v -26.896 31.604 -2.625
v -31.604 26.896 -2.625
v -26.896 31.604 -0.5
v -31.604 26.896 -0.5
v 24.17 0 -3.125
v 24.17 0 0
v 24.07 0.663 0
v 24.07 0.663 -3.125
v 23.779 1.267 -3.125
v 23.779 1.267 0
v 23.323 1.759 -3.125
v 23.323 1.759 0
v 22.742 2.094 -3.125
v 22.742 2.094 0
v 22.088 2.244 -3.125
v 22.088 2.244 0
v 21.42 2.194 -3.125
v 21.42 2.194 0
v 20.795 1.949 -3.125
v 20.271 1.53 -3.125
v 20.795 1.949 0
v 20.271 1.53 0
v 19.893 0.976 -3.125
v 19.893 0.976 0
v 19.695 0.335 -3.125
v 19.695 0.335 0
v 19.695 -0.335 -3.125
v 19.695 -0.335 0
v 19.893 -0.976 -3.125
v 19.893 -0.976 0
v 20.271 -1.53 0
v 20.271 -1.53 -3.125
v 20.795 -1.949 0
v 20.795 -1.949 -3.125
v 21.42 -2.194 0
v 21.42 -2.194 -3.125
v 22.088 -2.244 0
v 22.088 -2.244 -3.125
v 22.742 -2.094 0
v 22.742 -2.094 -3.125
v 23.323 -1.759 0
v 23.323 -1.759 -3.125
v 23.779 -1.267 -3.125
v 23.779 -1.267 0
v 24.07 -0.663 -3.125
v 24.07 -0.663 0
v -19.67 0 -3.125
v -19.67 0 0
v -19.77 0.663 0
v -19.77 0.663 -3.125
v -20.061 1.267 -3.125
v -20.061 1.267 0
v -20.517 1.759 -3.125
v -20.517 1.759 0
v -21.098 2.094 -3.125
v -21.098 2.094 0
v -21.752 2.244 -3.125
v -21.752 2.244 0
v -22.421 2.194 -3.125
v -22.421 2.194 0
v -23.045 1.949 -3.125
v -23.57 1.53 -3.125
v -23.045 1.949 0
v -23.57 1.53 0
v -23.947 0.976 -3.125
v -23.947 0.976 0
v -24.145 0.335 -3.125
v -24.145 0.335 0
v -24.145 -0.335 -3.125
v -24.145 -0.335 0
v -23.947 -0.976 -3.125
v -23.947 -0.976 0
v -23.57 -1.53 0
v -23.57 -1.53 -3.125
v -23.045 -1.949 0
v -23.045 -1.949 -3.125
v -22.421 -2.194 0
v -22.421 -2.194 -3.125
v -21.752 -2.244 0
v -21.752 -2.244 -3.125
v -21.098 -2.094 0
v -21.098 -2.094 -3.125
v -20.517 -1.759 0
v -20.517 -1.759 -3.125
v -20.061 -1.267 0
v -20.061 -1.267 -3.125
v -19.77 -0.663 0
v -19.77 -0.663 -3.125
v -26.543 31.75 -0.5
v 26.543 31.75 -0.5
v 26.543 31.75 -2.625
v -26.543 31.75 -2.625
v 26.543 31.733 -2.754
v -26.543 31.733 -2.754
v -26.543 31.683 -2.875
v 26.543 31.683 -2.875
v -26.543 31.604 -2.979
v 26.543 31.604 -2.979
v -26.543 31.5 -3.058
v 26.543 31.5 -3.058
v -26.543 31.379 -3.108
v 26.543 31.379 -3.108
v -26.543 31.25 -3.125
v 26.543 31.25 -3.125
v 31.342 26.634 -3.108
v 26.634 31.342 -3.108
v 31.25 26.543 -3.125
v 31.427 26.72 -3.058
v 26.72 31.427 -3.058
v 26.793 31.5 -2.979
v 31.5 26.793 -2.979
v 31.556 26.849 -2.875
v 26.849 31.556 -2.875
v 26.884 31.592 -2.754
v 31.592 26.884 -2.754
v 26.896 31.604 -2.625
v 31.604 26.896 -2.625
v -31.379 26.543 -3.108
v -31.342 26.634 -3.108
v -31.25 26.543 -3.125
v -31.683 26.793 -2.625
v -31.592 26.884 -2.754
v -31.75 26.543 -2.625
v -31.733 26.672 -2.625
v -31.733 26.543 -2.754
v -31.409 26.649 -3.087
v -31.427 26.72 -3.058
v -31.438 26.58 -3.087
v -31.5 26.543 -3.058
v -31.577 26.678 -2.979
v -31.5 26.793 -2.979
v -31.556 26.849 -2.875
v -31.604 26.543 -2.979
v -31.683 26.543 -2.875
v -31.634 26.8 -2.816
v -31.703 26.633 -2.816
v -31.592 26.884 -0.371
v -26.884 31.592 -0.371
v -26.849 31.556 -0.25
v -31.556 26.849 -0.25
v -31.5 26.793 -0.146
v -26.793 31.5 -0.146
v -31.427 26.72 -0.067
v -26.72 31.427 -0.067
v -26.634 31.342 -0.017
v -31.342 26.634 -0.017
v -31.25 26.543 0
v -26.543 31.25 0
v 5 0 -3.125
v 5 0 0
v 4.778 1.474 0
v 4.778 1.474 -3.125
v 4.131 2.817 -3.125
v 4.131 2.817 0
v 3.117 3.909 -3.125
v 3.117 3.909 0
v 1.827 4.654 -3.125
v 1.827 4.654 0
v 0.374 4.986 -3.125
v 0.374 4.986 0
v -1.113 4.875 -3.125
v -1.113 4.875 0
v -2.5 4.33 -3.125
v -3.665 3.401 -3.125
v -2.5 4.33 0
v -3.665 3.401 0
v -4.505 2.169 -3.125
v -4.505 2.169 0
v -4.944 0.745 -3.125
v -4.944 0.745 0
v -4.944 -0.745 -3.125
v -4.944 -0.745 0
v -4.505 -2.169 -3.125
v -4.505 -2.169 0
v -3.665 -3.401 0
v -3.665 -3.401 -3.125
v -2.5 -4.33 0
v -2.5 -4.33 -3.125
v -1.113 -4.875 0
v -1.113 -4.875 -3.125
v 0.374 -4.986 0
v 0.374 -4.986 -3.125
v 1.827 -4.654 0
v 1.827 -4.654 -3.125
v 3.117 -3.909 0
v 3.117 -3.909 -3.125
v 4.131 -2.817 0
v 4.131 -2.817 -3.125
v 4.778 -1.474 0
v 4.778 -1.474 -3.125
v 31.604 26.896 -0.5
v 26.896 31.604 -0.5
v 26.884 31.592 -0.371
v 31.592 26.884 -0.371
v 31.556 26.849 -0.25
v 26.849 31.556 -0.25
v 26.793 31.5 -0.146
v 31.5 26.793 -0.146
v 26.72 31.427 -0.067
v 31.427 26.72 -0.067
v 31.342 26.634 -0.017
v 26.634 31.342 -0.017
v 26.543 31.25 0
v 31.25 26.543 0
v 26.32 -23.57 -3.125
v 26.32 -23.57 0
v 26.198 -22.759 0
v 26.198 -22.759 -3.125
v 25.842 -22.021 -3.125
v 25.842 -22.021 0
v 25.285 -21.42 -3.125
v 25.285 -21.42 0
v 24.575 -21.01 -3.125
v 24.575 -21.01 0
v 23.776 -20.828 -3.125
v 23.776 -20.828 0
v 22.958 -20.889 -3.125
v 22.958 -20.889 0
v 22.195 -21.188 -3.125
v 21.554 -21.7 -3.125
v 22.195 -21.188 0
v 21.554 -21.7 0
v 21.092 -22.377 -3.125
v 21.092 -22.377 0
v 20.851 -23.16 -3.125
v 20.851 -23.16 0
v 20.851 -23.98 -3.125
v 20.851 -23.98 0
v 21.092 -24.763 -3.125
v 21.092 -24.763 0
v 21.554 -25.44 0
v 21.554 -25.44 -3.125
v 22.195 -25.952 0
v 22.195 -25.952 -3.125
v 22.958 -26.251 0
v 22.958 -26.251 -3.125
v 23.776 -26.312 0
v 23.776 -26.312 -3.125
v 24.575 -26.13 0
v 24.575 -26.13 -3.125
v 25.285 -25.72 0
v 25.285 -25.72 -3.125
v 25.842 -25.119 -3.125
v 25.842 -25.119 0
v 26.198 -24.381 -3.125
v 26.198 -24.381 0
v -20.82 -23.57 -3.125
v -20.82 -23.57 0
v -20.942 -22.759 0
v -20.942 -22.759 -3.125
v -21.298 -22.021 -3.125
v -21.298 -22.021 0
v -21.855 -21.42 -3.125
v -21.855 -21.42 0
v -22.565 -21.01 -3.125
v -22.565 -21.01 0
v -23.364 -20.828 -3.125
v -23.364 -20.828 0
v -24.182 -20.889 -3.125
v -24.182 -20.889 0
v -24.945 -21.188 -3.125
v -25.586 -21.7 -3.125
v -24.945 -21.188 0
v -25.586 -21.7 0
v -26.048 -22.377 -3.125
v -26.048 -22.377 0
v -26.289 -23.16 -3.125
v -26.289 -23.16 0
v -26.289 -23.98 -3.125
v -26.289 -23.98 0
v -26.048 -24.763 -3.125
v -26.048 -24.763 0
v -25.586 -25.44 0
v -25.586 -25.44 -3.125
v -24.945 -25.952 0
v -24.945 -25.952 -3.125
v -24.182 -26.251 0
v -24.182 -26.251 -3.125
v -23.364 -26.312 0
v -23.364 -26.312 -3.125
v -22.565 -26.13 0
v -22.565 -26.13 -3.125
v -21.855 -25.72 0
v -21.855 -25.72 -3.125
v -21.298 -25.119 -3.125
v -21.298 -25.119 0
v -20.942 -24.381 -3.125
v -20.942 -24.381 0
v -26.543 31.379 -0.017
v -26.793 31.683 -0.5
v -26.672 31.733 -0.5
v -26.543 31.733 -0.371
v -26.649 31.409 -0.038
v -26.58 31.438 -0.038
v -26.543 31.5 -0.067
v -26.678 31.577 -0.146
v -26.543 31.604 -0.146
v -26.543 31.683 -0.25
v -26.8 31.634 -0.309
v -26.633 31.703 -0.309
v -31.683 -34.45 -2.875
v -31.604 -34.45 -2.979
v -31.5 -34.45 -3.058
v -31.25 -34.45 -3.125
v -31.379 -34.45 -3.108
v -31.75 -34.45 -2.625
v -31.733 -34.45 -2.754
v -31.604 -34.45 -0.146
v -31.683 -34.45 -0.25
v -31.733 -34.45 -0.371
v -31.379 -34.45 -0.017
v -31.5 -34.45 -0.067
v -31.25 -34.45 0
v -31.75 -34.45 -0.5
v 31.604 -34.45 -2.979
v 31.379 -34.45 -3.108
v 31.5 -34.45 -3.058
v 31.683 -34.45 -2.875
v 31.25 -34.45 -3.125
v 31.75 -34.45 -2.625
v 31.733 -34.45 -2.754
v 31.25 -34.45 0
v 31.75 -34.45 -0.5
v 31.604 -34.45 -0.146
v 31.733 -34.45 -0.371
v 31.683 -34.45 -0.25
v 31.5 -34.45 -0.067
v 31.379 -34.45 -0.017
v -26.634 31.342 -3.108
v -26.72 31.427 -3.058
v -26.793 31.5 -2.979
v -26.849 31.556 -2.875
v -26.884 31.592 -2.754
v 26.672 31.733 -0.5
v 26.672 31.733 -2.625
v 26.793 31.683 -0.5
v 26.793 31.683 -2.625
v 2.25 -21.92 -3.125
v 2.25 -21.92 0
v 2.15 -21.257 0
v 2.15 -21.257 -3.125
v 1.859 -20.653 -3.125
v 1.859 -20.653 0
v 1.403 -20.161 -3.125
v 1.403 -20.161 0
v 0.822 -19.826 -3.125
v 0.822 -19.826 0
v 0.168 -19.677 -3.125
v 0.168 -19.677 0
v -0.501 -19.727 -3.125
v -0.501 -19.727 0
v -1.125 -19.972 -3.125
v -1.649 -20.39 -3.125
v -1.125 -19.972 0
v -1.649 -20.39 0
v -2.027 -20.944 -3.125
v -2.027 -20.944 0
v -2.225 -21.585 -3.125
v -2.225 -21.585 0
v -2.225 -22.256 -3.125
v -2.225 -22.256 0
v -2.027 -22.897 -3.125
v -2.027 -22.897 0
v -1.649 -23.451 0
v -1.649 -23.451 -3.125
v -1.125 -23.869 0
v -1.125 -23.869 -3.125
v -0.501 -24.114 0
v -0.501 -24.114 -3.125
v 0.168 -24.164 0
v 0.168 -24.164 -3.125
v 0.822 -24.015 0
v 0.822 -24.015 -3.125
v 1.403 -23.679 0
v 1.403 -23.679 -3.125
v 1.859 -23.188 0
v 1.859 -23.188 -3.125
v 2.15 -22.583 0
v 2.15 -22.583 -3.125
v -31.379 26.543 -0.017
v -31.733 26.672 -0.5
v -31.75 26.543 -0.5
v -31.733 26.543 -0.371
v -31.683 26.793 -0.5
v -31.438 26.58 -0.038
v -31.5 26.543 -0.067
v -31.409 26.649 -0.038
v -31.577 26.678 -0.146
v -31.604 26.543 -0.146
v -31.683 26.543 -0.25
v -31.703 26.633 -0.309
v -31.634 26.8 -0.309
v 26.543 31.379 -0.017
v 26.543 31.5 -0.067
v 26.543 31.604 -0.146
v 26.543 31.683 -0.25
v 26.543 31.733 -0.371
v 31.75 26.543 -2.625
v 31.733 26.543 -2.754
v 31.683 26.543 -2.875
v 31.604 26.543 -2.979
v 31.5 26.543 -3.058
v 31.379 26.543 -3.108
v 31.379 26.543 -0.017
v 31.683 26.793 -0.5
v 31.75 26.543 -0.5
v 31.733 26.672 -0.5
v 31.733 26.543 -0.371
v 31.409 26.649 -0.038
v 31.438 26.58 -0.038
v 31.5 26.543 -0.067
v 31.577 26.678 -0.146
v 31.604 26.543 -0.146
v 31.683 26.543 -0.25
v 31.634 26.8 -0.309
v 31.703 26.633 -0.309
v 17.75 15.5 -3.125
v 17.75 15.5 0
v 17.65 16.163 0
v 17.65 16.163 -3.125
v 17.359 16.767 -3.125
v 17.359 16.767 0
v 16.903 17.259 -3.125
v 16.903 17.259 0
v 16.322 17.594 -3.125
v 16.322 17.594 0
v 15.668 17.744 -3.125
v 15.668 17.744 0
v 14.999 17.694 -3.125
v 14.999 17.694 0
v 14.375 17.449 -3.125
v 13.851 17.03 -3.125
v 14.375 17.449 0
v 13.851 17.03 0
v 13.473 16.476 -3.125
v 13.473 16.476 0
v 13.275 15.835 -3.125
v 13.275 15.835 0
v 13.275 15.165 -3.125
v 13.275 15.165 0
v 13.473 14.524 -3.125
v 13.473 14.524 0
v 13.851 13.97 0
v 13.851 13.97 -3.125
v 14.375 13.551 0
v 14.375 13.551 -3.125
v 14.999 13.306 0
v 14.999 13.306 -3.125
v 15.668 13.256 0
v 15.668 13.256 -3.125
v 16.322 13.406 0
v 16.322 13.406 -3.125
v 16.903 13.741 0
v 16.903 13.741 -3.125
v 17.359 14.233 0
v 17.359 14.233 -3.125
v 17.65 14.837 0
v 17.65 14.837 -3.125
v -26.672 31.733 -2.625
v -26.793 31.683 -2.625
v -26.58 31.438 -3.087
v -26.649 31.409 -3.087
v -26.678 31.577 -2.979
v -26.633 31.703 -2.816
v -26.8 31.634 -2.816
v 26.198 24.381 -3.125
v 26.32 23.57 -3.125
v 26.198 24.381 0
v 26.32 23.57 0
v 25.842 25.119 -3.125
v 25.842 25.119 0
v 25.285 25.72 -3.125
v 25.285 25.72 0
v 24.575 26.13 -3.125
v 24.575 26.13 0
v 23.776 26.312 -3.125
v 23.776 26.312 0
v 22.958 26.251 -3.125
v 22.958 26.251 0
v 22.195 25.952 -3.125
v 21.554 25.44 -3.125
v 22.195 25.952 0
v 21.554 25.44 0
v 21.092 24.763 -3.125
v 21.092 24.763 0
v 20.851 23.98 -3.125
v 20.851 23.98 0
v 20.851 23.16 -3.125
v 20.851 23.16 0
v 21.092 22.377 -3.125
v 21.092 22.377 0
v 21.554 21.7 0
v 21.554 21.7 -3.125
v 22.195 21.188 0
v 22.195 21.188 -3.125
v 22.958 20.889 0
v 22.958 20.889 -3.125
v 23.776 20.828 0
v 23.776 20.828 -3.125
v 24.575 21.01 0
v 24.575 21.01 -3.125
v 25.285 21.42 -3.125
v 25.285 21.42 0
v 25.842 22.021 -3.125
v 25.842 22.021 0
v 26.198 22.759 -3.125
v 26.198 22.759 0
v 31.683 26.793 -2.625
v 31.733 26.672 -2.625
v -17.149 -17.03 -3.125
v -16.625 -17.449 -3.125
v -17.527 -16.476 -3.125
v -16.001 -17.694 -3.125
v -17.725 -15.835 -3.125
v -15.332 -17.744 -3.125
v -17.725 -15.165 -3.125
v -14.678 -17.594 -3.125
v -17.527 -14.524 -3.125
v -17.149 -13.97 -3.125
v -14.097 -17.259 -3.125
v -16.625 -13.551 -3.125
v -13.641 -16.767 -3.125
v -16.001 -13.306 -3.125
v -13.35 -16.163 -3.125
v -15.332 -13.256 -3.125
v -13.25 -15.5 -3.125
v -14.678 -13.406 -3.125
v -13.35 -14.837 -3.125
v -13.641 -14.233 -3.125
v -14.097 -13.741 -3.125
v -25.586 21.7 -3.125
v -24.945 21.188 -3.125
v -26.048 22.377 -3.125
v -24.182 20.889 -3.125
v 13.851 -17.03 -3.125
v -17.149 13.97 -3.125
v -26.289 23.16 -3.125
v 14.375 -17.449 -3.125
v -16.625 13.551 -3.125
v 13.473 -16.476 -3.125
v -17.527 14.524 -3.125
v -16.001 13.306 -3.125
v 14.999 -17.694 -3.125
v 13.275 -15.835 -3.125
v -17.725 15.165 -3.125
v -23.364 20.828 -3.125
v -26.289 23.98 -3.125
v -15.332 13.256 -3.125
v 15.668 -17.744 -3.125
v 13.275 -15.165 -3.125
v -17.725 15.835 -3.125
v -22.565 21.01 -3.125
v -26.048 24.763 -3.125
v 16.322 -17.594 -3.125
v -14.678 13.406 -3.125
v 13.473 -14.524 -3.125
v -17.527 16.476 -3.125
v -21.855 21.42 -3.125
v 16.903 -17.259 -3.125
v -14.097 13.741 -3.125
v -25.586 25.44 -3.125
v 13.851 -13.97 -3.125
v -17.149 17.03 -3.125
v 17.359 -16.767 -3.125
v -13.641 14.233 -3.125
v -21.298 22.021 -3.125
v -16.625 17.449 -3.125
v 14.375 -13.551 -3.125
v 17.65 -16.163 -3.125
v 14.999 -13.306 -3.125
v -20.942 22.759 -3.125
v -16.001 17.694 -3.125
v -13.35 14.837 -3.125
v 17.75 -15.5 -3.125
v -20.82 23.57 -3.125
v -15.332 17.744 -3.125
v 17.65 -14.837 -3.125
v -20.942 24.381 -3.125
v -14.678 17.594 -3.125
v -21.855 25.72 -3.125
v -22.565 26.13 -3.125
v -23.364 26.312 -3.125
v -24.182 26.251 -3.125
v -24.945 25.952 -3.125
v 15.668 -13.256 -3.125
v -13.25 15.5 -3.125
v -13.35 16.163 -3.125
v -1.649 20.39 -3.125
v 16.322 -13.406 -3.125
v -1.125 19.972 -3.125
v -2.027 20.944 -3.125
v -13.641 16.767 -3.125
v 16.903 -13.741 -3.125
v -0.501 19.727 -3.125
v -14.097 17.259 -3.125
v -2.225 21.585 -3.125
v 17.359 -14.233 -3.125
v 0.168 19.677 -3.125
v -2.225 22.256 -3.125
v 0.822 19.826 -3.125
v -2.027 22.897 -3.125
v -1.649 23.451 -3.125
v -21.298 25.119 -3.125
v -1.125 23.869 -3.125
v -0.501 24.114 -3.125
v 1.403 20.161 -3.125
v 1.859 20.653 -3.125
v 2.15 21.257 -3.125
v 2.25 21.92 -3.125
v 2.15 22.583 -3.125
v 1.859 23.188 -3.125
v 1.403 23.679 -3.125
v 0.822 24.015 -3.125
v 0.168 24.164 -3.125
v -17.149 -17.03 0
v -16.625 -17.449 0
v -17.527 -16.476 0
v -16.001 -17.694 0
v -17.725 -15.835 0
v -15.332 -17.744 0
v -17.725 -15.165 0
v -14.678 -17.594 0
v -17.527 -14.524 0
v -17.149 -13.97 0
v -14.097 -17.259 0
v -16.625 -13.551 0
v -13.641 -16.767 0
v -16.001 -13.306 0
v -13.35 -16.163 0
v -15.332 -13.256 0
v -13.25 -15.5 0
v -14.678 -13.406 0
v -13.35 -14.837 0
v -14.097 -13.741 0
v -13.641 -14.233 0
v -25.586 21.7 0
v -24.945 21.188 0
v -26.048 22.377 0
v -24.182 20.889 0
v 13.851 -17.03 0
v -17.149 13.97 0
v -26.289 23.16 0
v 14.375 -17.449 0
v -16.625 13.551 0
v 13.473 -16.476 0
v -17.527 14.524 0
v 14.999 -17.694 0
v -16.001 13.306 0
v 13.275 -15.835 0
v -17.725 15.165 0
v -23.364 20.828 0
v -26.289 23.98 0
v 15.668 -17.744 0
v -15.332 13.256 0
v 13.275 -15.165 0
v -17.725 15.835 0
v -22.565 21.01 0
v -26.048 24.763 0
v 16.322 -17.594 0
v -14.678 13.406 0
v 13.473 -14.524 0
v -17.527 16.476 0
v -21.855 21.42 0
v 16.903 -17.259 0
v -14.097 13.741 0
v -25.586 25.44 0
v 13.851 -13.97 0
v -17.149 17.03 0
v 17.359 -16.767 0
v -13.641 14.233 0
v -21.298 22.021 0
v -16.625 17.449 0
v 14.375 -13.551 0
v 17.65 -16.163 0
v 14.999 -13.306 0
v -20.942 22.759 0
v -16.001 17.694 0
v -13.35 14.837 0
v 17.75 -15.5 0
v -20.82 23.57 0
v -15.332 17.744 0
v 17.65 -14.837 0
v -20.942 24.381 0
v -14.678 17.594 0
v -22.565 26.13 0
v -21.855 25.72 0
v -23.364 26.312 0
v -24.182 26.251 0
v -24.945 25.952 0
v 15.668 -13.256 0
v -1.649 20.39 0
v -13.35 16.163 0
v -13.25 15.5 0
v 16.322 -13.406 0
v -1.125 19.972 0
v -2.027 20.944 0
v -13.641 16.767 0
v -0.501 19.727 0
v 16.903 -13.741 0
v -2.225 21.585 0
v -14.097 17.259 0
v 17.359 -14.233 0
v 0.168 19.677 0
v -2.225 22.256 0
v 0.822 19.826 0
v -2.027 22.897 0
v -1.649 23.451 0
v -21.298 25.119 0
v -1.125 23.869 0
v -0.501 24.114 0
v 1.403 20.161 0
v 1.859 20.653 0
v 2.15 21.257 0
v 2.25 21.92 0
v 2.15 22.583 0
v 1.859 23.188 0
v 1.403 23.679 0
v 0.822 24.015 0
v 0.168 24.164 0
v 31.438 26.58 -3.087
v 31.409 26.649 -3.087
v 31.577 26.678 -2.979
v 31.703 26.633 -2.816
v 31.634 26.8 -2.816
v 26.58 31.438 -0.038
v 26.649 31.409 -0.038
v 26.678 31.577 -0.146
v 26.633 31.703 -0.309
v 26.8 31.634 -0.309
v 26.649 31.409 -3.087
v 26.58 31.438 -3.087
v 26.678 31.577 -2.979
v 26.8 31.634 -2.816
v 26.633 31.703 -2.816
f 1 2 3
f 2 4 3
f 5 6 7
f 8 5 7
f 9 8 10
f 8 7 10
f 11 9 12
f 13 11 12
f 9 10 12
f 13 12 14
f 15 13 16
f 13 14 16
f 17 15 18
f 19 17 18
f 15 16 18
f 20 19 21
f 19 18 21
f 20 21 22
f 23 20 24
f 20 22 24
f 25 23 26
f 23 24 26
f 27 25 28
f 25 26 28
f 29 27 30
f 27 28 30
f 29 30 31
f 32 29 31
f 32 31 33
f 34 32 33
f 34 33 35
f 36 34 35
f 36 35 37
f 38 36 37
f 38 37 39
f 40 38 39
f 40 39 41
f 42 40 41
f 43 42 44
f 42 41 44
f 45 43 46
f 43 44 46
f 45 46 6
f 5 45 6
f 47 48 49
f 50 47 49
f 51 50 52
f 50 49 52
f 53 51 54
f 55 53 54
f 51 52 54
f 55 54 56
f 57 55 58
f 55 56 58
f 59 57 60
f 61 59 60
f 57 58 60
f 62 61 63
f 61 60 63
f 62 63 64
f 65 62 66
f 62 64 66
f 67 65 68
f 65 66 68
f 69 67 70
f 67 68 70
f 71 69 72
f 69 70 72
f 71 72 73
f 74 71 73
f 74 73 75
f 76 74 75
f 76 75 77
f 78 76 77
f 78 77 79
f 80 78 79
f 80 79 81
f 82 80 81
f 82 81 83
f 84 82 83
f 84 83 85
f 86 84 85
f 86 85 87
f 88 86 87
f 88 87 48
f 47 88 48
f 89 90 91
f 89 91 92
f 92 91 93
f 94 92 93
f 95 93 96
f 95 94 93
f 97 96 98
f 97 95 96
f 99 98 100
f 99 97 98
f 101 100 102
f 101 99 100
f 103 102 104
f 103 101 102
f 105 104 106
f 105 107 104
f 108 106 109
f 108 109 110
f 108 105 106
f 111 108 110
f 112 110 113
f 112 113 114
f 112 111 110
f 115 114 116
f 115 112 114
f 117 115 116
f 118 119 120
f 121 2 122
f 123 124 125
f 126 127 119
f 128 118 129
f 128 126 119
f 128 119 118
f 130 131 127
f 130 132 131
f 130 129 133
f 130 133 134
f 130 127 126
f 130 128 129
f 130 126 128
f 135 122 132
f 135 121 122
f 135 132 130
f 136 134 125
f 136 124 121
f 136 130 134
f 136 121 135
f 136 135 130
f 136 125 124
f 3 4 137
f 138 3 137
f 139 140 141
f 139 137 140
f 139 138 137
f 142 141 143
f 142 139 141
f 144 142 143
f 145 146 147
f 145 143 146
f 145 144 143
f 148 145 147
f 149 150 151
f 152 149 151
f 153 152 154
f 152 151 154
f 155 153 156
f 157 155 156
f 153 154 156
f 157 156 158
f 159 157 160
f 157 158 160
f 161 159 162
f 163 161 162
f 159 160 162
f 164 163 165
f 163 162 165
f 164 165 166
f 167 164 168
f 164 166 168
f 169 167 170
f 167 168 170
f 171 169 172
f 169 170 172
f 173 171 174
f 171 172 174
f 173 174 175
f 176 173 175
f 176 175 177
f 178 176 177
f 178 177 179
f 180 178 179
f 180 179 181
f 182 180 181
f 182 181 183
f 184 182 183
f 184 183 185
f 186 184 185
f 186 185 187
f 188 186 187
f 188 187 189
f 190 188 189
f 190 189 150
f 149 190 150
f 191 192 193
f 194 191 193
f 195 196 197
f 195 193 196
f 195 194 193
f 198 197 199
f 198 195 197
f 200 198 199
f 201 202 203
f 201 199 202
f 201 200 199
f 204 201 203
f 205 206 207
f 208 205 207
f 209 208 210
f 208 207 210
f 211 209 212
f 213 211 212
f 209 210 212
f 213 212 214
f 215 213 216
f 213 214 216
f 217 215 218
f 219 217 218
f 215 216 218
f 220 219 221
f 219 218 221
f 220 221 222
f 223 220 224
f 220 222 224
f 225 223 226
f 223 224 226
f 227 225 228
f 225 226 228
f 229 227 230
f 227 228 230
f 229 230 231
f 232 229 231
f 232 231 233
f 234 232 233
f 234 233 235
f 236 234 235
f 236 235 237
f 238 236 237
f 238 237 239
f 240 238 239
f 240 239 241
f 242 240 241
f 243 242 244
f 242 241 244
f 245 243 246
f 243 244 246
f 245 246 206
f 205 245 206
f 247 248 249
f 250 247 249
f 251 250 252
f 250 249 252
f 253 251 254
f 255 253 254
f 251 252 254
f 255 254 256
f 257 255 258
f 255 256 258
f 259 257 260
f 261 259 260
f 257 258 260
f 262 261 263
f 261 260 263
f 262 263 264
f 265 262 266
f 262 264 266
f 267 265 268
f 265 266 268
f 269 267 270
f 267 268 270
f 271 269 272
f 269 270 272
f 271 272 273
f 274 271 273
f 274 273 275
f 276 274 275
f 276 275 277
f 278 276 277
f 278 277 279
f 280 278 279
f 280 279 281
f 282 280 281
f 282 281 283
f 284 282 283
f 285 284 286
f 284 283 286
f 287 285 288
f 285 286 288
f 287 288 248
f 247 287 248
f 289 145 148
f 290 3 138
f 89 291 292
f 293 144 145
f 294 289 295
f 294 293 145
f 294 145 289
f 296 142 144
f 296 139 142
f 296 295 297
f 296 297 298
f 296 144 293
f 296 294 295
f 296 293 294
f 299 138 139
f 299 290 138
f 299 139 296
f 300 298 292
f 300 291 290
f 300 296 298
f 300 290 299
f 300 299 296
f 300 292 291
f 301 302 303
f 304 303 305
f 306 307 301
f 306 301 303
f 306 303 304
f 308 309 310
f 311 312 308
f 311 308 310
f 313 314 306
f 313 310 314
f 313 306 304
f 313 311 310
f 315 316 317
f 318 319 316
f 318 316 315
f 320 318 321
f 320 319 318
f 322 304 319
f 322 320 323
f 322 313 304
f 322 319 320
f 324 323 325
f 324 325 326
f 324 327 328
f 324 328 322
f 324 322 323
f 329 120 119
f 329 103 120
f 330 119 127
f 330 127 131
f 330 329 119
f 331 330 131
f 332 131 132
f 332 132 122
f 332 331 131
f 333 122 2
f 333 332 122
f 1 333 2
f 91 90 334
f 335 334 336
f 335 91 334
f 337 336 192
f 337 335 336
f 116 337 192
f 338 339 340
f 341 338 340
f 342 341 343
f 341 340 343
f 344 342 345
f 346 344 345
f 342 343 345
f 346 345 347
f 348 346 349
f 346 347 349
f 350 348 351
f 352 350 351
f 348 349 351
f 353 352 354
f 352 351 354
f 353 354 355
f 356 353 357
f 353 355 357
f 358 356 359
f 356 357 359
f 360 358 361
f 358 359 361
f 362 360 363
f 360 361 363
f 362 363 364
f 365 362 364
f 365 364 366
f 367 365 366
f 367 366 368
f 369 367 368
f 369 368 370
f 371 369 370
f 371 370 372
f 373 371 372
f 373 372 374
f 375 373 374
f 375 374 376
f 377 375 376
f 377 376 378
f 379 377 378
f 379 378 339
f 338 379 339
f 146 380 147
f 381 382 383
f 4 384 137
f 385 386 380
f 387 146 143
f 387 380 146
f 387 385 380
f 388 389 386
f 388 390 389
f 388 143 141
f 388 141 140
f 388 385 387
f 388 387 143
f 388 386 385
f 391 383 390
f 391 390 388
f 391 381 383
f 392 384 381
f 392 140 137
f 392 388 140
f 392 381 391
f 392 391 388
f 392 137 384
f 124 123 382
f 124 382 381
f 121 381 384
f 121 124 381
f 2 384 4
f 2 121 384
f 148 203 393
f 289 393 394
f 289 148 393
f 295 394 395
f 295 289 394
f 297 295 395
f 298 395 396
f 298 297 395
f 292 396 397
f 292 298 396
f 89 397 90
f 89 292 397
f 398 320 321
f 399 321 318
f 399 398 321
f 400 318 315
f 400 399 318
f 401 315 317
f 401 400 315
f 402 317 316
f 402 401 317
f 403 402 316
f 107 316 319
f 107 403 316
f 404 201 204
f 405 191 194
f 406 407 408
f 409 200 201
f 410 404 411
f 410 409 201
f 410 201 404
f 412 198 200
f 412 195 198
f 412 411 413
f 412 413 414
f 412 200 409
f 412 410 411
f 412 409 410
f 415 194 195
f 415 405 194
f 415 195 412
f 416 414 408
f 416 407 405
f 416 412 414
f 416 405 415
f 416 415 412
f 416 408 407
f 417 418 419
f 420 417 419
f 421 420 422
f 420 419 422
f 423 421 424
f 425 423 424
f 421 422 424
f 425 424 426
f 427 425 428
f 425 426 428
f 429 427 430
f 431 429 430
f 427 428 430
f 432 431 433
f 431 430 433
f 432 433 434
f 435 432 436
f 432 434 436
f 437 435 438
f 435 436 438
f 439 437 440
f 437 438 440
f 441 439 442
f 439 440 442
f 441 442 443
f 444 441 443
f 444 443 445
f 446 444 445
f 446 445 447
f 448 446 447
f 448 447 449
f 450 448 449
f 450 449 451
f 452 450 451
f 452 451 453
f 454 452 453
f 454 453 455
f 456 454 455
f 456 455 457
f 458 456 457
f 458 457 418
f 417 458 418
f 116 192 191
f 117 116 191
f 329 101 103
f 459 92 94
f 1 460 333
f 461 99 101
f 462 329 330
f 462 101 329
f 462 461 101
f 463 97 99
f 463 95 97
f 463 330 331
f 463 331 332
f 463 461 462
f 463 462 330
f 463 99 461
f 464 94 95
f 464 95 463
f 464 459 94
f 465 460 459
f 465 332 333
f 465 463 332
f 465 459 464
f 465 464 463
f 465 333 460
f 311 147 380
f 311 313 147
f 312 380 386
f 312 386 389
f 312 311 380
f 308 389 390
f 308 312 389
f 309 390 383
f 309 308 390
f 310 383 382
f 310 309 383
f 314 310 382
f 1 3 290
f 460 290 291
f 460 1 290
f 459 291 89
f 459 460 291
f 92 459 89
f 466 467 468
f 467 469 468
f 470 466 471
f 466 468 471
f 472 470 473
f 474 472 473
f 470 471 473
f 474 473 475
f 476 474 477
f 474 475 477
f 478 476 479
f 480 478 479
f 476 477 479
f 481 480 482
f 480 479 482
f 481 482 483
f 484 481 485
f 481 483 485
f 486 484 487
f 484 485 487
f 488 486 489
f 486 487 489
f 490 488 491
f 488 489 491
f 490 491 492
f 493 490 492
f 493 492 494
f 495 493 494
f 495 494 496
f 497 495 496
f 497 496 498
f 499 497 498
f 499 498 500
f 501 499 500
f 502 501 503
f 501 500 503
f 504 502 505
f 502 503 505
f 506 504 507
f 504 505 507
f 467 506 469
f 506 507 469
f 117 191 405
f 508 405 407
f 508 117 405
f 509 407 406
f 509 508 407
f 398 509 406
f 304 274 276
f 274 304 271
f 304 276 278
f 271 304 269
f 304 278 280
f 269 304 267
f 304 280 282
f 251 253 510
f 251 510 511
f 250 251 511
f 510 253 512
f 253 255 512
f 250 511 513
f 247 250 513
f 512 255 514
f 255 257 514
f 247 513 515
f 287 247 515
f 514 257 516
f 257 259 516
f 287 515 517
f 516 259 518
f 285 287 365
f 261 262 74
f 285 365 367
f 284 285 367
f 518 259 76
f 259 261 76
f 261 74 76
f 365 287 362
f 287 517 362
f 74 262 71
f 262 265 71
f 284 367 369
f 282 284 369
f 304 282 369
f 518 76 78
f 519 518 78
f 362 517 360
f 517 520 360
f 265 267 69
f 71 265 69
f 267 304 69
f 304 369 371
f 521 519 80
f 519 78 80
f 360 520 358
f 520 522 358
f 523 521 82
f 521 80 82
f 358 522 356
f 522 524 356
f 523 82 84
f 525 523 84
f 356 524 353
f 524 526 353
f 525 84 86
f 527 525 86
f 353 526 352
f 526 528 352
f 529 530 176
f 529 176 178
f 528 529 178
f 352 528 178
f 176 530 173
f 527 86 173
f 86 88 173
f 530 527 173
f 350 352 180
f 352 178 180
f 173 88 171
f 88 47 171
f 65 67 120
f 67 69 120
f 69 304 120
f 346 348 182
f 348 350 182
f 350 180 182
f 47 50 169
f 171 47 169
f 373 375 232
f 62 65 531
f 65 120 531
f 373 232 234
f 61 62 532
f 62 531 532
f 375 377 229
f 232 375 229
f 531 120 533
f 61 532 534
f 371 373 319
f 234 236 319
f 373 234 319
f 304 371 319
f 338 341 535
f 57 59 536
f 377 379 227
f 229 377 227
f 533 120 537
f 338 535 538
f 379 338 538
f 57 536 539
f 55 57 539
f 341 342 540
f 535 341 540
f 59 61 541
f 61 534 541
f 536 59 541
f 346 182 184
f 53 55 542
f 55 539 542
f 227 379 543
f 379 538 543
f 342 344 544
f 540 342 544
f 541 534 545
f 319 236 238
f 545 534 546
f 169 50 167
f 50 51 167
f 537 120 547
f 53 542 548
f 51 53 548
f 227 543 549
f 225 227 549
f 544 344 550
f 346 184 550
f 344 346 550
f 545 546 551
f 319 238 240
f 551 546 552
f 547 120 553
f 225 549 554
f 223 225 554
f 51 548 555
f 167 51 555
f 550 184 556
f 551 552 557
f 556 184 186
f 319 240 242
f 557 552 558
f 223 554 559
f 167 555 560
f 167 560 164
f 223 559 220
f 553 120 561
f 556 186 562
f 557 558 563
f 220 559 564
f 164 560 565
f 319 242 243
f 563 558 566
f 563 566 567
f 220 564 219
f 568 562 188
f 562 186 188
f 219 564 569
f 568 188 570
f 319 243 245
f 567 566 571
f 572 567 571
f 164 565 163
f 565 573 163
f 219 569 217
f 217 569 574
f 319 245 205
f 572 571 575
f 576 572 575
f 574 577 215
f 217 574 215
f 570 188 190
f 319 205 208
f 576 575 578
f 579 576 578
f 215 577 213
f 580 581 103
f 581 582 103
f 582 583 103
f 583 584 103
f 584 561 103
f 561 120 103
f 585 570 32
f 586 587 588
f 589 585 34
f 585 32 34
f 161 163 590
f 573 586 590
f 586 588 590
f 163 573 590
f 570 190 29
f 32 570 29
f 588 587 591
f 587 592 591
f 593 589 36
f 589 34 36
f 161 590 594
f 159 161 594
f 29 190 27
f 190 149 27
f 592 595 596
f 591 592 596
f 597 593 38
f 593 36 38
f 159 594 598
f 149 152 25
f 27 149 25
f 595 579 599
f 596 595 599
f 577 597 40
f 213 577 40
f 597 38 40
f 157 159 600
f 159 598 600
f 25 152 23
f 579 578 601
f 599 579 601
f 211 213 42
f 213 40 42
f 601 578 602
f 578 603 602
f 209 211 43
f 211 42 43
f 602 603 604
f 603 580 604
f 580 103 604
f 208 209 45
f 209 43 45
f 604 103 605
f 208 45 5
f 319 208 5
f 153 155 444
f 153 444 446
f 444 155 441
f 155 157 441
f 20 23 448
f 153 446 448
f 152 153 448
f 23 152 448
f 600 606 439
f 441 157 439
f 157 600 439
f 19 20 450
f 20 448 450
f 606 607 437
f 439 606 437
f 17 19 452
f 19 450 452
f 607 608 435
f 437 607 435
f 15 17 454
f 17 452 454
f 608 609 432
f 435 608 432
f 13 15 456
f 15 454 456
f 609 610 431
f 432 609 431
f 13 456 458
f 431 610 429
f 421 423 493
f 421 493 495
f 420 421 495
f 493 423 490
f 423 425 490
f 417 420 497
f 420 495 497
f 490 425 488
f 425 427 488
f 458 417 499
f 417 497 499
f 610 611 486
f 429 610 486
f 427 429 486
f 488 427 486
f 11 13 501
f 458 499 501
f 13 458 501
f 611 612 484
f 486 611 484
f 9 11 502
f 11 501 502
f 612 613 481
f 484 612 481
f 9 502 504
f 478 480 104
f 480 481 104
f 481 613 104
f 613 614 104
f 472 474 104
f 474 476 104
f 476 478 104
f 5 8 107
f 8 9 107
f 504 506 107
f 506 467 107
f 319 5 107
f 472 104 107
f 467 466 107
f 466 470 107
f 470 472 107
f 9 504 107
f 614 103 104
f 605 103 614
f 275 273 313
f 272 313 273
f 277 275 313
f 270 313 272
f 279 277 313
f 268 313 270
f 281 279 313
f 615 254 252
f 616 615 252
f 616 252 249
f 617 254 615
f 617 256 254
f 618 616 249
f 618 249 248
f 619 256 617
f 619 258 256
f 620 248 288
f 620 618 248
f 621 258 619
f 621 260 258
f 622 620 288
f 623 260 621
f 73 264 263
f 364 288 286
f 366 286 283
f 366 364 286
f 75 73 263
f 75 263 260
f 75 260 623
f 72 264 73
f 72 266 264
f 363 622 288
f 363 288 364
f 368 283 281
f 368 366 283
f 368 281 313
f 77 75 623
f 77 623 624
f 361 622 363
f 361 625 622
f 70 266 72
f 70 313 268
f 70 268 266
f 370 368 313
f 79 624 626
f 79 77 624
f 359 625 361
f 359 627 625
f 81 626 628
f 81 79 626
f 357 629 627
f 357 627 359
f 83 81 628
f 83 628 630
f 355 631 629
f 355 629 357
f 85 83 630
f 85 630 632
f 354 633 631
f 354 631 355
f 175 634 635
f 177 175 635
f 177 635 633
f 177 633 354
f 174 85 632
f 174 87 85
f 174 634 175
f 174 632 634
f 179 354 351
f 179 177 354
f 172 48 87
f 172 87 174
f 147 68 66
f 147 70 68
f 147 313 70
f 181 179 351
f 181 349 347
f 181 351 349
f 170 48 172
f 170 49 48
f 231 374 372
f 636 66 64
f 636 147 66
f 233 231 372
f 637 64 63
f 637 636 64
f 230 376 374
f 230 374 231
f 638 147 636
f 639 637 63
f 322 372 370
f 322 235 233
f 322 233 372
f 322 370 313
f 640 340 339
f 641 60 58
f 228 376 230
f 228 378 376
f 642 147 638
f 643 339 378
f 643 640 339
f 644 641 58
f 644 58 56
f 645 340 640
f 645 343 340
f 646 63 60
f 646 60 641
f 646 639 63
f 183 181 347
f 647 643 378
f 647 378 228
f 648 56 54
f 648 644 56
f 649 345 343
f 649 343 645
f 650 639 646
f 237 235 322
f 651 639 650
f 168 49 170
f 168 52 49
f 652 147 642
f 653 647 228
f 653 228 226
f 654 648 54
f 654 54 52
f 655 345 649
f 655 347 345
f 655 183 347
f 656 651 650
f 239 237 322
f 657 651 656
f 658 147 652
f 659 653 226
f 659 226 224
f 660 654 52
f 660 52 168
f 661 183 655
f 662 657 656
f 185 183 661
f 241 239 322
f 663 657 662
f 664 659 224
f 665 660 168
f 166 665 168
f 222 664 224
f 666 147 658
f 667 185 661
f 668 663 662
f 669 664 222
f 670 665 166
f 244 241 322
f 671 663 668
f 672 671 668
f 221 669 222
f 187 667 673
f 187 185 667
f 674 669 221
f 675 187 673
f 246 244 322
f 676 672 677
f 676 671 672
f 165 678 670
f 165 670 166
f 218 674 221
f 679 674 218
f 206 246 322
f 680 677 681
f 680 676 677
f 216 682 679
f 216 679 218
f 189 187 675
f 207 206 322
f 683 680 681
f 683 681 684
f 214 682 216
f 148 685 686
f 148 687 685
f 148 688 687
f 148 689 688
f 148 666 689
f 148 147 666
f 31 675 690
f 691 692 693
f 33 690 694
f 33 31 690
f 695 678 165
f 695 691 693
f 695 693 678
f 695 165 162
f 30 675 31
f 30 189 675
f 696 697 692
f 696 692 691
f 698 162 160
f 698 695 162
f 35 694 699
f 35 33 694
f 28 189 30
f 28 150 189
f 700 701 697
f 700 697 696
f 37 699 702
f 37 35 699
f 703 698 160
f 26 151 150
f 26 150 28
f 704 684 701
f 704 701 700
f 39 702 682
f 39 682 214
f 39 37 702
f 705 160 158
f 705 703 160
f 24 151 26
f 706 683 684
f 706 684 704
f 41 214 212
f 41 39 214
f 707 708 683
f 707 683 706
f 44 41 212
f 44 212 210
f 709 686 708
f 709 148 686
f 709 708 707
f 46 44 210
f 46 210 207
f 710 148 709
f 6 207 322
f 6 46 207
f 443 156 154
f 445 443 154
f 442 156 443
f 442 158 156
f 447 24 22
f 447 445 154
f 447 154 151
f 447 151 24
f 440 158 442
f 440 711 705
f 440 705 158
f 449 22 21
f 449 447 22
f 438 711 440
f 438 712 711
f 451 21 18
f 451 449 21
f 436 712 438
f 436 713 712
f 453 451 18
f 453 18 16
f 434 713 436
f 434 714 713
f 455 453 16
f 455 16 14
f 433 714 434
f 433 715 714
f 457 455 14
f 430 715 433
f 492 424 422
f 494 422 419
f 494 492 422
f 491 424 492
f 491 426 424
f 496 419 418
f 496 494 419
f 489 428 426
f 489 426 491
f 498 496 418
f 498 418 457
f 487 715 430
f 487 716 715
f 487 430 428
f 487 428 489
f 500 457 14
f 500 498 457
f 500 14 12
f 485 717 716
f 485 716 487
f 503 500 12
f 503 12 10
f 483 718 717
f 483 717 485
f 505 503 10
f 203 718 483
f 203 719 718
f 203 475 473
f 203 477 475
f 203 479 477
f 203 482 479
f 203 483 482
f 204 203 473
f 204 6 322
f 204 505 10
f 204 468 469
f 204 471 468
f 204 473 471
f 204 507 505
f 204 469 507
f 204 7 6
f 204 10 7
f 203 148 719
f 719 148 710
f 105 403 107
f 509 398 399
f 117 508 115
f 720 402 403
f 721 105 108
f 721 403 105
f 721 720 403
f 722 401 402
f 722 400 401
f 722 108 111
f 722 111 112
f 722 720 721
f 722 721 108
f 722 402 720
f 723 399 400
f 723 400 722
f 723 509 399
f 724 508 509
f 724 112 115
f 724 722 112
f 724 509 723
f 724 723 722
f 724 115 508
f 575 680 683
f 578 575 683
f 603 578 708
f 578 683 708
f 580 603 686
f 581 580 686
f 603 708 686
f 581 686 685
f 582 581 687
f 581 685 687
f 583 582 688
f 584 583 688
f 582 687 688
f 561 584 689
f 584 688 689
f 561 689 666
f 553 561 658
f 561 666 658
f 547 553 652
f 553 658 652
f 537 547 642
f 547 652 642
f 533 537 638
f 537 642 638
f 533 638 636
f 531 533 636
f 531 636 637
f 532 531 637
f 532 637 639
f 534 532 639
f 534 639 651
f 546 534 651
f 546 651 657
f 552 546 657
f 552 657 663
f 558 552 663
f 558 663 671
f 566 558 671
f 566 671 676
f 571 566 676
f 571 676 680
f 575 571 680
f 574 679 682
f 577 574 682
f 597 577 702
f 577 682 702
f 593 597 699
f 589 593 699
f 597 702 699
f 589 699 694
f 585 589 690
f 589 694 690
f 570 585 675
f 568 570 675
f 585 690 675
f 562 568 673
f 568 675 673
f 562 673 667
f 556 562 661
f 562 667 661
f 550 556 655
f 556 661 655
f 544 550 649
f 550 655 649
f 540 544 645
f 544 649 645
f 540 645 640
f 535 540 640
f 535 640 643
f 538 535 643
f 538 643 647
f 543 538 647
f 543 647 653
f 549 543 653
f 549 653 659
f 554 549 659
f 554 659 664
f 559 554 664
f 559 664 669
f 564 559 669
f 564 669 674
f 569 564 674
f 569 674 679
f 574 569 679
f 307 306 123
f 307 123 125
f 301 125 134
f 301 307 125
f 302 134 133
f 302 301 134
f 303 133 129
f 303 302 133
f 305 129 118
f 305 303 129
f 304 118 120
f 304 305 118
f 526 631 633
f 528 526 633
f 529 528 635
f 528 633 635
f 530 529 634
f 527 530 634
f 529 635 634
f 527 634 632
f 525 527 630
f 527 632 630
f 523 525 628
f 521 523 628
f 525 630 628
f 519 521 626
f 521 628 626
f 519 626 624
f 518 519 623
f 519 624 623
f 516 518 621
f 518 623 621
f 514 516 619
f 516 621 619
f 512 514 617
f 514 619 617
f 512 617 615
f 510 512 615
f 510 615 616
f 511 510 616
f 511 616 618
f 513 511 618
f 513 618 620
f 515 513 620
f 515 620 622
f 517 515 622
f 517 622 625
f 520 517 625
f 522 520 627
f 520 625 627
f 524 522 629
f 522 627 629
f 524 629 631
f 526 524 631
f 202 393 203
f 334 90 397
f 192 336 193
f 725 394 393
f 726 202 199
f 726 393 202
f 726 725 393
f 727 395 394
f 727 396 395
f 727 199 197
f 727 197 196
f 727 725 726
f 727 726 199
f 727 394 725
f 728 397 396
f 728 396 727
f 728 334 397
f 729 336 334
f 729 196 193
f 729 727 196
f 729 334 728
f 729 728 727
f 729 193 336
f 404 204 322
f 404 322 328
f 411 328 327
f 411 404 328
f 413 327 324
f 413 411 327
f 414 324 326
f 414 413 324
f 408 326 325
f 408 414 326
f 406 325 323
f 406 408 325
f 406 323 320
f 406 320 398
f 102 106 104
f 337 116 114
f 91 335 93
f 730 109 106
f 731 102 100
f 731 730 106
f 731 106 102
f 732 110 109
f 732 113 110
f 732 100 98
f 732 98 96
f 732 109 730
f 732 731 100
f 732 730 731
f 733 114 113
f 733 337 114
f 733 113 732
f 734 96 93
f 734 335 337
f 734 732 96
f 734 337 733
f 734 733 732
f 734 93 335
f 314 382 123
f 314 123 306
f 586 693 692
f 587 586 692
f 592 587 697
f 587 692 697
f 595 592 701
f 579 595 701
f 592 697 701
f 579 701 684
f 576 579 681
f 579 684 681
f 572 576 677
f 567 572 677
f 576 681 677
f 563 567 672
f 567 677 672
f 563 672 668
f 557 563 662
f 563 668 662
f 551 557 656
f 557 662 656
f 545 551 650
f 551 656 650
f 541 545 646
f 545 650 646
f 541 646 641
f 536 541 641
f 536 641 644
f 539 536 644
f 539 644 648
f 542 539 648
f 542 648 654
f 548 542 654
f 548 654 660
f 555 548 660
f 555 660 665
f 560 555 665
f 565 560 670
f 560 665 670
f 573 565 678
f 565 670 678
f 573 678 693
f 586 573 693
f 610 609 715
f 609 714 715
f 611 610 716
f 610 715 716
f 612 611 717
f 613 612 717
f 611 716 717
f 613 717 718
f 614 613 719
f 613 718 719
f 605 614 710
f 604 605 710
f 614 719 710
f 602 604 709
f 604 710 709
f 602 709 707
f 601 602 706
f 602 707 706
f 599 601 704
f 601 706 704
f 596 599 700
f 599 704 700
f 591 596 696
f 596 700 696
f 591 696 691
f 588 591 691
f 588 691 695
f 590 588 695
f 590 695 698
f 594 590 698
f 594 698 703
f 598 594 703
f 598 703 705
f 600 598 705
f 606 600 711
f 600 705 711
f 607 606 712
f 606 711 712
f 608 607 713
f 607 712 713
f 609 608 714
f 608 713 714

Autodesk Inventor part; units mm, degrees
ref_plane "YZ Plane" through (0, 0, 0) normal (1, 0, 0) x (0, 1, 0)
ref_plane "XZ Plane" through (0, 0, 0) normal (0, 1, 0) x (-1, 0, 0)
ref_plane "XY Plane" through (0, 0, 0) normal (0, 0, 1) x (1, 0, 0)
sketch "Sketch1" plane through (0, 0, 0) normal (0, 0, 1) x (1, 0, 0)
  line L0 (26.75, 31.75) -> (-26.75, 31.75)
  line L1 (-31.75, 26.75) -> (-31.75, -34.45)
  line L2 (-31.75, -34.45) -> (31.75, -34.45)
  line L3 (31.75, -34.45) -> (31.75, 26.75)
  circle A0 centre (0, 0) radius 5
  circle A1 centre (15.5, 15.5) radius 2.25
  circle A2 centre (-15.5, 15.5) radius 2.25
  circle A3 centre (-15.5, -15.5) radius 2.25
  circle A4 centre (15.5, -15.5) radius 2.25
  line L4 (-15.5, -15.5) -> (15.5, -15.5) construction
  line L5 (15.5, -15.5) -> (15.5, 15.5) construction
  line L6 (15.5, 15.5) -> (-15.5, 15.5) construction
  line L7 (-15.5, 15.5) -> (-15.5, -15.5) construction
  line L8 (0, 2.2207) -> (0, -2.8787) construction
  line L9 (-1.8221, 0) -> (3.1794, 0) construction
  circle A5 centre (0, 21.9203) radius 2.25
  circle A6 centre (0, -21.9203) radius 2.25
  circle A7 centre (-21.9203, 0) radius 2.25
  circle A8 centre (21.9203, 0) radius 2.25
  line L10 (0, 21.9203) -> (-21.9203, 0) construction
  line L11 (-21.9203, 0) -> (0, -21.9203) construction
  line L12 (0, -21.9203) -> (21.9203, 0) construction
  line L13 (21.9203, 0) -> (0, 21.9203) construction
  line L14 (-23.57, 23.57) -> (23.57, 23.57) construction
  line L15 (23.57, 23.57) -> (23.57, -23.57) construction
  line L16 (23.57, -23.57) -> (-23.57, -23.57) construction
  line L17 (-23.57, -23.57) -> (-23.57, 23.57) construction
  circle A9 centre (-23.57, 23.57) radius 2.75
  circle A10 centre (-23.57, -23.57) radius 2.75
  circle A11 centre (23.57, -23.57) radius 2.75
  circle A12 centre (23.57, 23.57) radius 2.75
  line L18 (-23.6, 28.2) -> (23.6, 28.2) construction
  line L19 (28.2, 23.6) -> (28.2, -23.6) construction
  line L20 (23.6, -28.2) -> (-23.6, -28.2) construction
  line L21 (-28.2, -23.6) -> (-28.2, 23.6) construction
  arc A13 (-23.6, 28.2) -> (-28.2, 23.6) centre (-23.6, 23.6) ccw construction
  arc A14 (-28.2, -23.6) -> (-23.6, -28.2) centre (-23.6, -23.6) ccw construction
  arc A15 (23.6, -28.2) -> (28.2, -23.6) centre (23.6, -23.6) ccw construction
  arc A16 (28.2, 23.6) -> (23.6, 28.2) centre (23.6, 23.6) ccw construction
  line L22 (-31.75, 26.75) -> (-26.75, 31.75)
  line L23 (26.75, 31.75) -> (31.75, 26.75)
  line L24 (-15.5, 21) -> (15.5, 21) construction
  line L25 (21, 15.5) -> (21, -15.5) construction
  line L26 (15.5, -21) -> (-15.5, -21) construction
  line L27 (-21, -15.5) -> (-21, 15.5) construction
  line L28 (-21, 15.5) -> (-15.5, 21) construction
  line L29 (15.5, 21) -> (21, 15.5) construction
  line L30 (21, -15.5) -> (15.5, -21) construction
  line L31 (-15.5, -21) -> (-21, -15.5) construction
  point P0 (-31.75, 31.75)
  point P1 (-31.75, 31.75)
  point P2 (31.75, 31.75)
  point P3 (28.2, -28.2)
  point P4 (-28.2, -28.2)
  point P5 (-31.75, 31.75)
  point P6 (31.75, 31.75)
  point P7 (-21, 21)
  point P8 (21, -21)
  point P9 (21, 21)
  point P10 (-21, -21)
  dimension "MotorPlateWidth" = 63.5
  dimension "MotorPlateHeight" = 66.2
  dimension "d5" = 31.75
  dimension "ShaftHole" = 10
  dimension "d10" = 4.5
  dimension "NEMA17HoleSpacing" = 31
  dimension "NEMA23HoleSpacing" = 47.14
  dimension "NEMA23MountingHole" = 5.5
  dimension "NEMA23Motor" = 56.4
  dimension "d35" = 4.6
  dimension "CornerChamfer" = 5
  dimension "d37" = 5
  dimension "d38" = 5
  dimension "d39" = 5
  dimension "NEMA17Motor" = 42
  dimension "NEMA17CornerChamfer" = 5.5
  dimension "d42" = 5.5
  dimension "d43" = 5.5
  dimension "d44" = 5.5
  dimension "d45" = 5.5
  dimension "d46" = 5.5
  dimension "d47" = 5.5
  dimension "d48" = 5.5
extrude "Extrusion1" add sketch "Sketch1" against normal blind 3.125
fillet "Fillet2" radius 0.5 14 edges at (-31.75, 26.75, -1.5625) (-29.25, 29.25, -3.125) (-26.75, 31.75, -1.5625) (0, 31.75, -3.125) (26.75, 31.75, -1.5625) (29.25, 29.25, -3.125) (31.75, 26.75, -1.5625) (-31.75, -3.85, -3.125) (31.75, -3.85, -3.125) (-29.25, 29.25, 0) (-31.75, -3.85, 0) (0, 31.75, 0) (29.25, 29.25, 0) (31.75, -3.85, 0)
equation "\"d5\" = 0.5 * MotorPlateWidth"
equation "\"d10\" = NEMA17MountingHole"
equation "\"d37\" = CornerChamfer"
equation "\"d38\" = CornerChamfer"
equation "\"d39\" = CornerChamfer"
equation "\"d42\" = NEMA17CornerChamfer"
equation "\"d43\" = NEMA17CornerChamfer"
equation "\"d44\" = NEMA17CornerChamfer"
equation "\"d45\" = NEMA17CornerChamfer"
equation "\"d46\" = NEMA17CornerChamfer"
equation "\"d47\" = NEMA17CornerChamfer"
equation "\"d48\" = NEMA17CornerChamfer"
equation "\"NEMA17MountingHole\" = 4.5"
properties part number "MOTOR001"
